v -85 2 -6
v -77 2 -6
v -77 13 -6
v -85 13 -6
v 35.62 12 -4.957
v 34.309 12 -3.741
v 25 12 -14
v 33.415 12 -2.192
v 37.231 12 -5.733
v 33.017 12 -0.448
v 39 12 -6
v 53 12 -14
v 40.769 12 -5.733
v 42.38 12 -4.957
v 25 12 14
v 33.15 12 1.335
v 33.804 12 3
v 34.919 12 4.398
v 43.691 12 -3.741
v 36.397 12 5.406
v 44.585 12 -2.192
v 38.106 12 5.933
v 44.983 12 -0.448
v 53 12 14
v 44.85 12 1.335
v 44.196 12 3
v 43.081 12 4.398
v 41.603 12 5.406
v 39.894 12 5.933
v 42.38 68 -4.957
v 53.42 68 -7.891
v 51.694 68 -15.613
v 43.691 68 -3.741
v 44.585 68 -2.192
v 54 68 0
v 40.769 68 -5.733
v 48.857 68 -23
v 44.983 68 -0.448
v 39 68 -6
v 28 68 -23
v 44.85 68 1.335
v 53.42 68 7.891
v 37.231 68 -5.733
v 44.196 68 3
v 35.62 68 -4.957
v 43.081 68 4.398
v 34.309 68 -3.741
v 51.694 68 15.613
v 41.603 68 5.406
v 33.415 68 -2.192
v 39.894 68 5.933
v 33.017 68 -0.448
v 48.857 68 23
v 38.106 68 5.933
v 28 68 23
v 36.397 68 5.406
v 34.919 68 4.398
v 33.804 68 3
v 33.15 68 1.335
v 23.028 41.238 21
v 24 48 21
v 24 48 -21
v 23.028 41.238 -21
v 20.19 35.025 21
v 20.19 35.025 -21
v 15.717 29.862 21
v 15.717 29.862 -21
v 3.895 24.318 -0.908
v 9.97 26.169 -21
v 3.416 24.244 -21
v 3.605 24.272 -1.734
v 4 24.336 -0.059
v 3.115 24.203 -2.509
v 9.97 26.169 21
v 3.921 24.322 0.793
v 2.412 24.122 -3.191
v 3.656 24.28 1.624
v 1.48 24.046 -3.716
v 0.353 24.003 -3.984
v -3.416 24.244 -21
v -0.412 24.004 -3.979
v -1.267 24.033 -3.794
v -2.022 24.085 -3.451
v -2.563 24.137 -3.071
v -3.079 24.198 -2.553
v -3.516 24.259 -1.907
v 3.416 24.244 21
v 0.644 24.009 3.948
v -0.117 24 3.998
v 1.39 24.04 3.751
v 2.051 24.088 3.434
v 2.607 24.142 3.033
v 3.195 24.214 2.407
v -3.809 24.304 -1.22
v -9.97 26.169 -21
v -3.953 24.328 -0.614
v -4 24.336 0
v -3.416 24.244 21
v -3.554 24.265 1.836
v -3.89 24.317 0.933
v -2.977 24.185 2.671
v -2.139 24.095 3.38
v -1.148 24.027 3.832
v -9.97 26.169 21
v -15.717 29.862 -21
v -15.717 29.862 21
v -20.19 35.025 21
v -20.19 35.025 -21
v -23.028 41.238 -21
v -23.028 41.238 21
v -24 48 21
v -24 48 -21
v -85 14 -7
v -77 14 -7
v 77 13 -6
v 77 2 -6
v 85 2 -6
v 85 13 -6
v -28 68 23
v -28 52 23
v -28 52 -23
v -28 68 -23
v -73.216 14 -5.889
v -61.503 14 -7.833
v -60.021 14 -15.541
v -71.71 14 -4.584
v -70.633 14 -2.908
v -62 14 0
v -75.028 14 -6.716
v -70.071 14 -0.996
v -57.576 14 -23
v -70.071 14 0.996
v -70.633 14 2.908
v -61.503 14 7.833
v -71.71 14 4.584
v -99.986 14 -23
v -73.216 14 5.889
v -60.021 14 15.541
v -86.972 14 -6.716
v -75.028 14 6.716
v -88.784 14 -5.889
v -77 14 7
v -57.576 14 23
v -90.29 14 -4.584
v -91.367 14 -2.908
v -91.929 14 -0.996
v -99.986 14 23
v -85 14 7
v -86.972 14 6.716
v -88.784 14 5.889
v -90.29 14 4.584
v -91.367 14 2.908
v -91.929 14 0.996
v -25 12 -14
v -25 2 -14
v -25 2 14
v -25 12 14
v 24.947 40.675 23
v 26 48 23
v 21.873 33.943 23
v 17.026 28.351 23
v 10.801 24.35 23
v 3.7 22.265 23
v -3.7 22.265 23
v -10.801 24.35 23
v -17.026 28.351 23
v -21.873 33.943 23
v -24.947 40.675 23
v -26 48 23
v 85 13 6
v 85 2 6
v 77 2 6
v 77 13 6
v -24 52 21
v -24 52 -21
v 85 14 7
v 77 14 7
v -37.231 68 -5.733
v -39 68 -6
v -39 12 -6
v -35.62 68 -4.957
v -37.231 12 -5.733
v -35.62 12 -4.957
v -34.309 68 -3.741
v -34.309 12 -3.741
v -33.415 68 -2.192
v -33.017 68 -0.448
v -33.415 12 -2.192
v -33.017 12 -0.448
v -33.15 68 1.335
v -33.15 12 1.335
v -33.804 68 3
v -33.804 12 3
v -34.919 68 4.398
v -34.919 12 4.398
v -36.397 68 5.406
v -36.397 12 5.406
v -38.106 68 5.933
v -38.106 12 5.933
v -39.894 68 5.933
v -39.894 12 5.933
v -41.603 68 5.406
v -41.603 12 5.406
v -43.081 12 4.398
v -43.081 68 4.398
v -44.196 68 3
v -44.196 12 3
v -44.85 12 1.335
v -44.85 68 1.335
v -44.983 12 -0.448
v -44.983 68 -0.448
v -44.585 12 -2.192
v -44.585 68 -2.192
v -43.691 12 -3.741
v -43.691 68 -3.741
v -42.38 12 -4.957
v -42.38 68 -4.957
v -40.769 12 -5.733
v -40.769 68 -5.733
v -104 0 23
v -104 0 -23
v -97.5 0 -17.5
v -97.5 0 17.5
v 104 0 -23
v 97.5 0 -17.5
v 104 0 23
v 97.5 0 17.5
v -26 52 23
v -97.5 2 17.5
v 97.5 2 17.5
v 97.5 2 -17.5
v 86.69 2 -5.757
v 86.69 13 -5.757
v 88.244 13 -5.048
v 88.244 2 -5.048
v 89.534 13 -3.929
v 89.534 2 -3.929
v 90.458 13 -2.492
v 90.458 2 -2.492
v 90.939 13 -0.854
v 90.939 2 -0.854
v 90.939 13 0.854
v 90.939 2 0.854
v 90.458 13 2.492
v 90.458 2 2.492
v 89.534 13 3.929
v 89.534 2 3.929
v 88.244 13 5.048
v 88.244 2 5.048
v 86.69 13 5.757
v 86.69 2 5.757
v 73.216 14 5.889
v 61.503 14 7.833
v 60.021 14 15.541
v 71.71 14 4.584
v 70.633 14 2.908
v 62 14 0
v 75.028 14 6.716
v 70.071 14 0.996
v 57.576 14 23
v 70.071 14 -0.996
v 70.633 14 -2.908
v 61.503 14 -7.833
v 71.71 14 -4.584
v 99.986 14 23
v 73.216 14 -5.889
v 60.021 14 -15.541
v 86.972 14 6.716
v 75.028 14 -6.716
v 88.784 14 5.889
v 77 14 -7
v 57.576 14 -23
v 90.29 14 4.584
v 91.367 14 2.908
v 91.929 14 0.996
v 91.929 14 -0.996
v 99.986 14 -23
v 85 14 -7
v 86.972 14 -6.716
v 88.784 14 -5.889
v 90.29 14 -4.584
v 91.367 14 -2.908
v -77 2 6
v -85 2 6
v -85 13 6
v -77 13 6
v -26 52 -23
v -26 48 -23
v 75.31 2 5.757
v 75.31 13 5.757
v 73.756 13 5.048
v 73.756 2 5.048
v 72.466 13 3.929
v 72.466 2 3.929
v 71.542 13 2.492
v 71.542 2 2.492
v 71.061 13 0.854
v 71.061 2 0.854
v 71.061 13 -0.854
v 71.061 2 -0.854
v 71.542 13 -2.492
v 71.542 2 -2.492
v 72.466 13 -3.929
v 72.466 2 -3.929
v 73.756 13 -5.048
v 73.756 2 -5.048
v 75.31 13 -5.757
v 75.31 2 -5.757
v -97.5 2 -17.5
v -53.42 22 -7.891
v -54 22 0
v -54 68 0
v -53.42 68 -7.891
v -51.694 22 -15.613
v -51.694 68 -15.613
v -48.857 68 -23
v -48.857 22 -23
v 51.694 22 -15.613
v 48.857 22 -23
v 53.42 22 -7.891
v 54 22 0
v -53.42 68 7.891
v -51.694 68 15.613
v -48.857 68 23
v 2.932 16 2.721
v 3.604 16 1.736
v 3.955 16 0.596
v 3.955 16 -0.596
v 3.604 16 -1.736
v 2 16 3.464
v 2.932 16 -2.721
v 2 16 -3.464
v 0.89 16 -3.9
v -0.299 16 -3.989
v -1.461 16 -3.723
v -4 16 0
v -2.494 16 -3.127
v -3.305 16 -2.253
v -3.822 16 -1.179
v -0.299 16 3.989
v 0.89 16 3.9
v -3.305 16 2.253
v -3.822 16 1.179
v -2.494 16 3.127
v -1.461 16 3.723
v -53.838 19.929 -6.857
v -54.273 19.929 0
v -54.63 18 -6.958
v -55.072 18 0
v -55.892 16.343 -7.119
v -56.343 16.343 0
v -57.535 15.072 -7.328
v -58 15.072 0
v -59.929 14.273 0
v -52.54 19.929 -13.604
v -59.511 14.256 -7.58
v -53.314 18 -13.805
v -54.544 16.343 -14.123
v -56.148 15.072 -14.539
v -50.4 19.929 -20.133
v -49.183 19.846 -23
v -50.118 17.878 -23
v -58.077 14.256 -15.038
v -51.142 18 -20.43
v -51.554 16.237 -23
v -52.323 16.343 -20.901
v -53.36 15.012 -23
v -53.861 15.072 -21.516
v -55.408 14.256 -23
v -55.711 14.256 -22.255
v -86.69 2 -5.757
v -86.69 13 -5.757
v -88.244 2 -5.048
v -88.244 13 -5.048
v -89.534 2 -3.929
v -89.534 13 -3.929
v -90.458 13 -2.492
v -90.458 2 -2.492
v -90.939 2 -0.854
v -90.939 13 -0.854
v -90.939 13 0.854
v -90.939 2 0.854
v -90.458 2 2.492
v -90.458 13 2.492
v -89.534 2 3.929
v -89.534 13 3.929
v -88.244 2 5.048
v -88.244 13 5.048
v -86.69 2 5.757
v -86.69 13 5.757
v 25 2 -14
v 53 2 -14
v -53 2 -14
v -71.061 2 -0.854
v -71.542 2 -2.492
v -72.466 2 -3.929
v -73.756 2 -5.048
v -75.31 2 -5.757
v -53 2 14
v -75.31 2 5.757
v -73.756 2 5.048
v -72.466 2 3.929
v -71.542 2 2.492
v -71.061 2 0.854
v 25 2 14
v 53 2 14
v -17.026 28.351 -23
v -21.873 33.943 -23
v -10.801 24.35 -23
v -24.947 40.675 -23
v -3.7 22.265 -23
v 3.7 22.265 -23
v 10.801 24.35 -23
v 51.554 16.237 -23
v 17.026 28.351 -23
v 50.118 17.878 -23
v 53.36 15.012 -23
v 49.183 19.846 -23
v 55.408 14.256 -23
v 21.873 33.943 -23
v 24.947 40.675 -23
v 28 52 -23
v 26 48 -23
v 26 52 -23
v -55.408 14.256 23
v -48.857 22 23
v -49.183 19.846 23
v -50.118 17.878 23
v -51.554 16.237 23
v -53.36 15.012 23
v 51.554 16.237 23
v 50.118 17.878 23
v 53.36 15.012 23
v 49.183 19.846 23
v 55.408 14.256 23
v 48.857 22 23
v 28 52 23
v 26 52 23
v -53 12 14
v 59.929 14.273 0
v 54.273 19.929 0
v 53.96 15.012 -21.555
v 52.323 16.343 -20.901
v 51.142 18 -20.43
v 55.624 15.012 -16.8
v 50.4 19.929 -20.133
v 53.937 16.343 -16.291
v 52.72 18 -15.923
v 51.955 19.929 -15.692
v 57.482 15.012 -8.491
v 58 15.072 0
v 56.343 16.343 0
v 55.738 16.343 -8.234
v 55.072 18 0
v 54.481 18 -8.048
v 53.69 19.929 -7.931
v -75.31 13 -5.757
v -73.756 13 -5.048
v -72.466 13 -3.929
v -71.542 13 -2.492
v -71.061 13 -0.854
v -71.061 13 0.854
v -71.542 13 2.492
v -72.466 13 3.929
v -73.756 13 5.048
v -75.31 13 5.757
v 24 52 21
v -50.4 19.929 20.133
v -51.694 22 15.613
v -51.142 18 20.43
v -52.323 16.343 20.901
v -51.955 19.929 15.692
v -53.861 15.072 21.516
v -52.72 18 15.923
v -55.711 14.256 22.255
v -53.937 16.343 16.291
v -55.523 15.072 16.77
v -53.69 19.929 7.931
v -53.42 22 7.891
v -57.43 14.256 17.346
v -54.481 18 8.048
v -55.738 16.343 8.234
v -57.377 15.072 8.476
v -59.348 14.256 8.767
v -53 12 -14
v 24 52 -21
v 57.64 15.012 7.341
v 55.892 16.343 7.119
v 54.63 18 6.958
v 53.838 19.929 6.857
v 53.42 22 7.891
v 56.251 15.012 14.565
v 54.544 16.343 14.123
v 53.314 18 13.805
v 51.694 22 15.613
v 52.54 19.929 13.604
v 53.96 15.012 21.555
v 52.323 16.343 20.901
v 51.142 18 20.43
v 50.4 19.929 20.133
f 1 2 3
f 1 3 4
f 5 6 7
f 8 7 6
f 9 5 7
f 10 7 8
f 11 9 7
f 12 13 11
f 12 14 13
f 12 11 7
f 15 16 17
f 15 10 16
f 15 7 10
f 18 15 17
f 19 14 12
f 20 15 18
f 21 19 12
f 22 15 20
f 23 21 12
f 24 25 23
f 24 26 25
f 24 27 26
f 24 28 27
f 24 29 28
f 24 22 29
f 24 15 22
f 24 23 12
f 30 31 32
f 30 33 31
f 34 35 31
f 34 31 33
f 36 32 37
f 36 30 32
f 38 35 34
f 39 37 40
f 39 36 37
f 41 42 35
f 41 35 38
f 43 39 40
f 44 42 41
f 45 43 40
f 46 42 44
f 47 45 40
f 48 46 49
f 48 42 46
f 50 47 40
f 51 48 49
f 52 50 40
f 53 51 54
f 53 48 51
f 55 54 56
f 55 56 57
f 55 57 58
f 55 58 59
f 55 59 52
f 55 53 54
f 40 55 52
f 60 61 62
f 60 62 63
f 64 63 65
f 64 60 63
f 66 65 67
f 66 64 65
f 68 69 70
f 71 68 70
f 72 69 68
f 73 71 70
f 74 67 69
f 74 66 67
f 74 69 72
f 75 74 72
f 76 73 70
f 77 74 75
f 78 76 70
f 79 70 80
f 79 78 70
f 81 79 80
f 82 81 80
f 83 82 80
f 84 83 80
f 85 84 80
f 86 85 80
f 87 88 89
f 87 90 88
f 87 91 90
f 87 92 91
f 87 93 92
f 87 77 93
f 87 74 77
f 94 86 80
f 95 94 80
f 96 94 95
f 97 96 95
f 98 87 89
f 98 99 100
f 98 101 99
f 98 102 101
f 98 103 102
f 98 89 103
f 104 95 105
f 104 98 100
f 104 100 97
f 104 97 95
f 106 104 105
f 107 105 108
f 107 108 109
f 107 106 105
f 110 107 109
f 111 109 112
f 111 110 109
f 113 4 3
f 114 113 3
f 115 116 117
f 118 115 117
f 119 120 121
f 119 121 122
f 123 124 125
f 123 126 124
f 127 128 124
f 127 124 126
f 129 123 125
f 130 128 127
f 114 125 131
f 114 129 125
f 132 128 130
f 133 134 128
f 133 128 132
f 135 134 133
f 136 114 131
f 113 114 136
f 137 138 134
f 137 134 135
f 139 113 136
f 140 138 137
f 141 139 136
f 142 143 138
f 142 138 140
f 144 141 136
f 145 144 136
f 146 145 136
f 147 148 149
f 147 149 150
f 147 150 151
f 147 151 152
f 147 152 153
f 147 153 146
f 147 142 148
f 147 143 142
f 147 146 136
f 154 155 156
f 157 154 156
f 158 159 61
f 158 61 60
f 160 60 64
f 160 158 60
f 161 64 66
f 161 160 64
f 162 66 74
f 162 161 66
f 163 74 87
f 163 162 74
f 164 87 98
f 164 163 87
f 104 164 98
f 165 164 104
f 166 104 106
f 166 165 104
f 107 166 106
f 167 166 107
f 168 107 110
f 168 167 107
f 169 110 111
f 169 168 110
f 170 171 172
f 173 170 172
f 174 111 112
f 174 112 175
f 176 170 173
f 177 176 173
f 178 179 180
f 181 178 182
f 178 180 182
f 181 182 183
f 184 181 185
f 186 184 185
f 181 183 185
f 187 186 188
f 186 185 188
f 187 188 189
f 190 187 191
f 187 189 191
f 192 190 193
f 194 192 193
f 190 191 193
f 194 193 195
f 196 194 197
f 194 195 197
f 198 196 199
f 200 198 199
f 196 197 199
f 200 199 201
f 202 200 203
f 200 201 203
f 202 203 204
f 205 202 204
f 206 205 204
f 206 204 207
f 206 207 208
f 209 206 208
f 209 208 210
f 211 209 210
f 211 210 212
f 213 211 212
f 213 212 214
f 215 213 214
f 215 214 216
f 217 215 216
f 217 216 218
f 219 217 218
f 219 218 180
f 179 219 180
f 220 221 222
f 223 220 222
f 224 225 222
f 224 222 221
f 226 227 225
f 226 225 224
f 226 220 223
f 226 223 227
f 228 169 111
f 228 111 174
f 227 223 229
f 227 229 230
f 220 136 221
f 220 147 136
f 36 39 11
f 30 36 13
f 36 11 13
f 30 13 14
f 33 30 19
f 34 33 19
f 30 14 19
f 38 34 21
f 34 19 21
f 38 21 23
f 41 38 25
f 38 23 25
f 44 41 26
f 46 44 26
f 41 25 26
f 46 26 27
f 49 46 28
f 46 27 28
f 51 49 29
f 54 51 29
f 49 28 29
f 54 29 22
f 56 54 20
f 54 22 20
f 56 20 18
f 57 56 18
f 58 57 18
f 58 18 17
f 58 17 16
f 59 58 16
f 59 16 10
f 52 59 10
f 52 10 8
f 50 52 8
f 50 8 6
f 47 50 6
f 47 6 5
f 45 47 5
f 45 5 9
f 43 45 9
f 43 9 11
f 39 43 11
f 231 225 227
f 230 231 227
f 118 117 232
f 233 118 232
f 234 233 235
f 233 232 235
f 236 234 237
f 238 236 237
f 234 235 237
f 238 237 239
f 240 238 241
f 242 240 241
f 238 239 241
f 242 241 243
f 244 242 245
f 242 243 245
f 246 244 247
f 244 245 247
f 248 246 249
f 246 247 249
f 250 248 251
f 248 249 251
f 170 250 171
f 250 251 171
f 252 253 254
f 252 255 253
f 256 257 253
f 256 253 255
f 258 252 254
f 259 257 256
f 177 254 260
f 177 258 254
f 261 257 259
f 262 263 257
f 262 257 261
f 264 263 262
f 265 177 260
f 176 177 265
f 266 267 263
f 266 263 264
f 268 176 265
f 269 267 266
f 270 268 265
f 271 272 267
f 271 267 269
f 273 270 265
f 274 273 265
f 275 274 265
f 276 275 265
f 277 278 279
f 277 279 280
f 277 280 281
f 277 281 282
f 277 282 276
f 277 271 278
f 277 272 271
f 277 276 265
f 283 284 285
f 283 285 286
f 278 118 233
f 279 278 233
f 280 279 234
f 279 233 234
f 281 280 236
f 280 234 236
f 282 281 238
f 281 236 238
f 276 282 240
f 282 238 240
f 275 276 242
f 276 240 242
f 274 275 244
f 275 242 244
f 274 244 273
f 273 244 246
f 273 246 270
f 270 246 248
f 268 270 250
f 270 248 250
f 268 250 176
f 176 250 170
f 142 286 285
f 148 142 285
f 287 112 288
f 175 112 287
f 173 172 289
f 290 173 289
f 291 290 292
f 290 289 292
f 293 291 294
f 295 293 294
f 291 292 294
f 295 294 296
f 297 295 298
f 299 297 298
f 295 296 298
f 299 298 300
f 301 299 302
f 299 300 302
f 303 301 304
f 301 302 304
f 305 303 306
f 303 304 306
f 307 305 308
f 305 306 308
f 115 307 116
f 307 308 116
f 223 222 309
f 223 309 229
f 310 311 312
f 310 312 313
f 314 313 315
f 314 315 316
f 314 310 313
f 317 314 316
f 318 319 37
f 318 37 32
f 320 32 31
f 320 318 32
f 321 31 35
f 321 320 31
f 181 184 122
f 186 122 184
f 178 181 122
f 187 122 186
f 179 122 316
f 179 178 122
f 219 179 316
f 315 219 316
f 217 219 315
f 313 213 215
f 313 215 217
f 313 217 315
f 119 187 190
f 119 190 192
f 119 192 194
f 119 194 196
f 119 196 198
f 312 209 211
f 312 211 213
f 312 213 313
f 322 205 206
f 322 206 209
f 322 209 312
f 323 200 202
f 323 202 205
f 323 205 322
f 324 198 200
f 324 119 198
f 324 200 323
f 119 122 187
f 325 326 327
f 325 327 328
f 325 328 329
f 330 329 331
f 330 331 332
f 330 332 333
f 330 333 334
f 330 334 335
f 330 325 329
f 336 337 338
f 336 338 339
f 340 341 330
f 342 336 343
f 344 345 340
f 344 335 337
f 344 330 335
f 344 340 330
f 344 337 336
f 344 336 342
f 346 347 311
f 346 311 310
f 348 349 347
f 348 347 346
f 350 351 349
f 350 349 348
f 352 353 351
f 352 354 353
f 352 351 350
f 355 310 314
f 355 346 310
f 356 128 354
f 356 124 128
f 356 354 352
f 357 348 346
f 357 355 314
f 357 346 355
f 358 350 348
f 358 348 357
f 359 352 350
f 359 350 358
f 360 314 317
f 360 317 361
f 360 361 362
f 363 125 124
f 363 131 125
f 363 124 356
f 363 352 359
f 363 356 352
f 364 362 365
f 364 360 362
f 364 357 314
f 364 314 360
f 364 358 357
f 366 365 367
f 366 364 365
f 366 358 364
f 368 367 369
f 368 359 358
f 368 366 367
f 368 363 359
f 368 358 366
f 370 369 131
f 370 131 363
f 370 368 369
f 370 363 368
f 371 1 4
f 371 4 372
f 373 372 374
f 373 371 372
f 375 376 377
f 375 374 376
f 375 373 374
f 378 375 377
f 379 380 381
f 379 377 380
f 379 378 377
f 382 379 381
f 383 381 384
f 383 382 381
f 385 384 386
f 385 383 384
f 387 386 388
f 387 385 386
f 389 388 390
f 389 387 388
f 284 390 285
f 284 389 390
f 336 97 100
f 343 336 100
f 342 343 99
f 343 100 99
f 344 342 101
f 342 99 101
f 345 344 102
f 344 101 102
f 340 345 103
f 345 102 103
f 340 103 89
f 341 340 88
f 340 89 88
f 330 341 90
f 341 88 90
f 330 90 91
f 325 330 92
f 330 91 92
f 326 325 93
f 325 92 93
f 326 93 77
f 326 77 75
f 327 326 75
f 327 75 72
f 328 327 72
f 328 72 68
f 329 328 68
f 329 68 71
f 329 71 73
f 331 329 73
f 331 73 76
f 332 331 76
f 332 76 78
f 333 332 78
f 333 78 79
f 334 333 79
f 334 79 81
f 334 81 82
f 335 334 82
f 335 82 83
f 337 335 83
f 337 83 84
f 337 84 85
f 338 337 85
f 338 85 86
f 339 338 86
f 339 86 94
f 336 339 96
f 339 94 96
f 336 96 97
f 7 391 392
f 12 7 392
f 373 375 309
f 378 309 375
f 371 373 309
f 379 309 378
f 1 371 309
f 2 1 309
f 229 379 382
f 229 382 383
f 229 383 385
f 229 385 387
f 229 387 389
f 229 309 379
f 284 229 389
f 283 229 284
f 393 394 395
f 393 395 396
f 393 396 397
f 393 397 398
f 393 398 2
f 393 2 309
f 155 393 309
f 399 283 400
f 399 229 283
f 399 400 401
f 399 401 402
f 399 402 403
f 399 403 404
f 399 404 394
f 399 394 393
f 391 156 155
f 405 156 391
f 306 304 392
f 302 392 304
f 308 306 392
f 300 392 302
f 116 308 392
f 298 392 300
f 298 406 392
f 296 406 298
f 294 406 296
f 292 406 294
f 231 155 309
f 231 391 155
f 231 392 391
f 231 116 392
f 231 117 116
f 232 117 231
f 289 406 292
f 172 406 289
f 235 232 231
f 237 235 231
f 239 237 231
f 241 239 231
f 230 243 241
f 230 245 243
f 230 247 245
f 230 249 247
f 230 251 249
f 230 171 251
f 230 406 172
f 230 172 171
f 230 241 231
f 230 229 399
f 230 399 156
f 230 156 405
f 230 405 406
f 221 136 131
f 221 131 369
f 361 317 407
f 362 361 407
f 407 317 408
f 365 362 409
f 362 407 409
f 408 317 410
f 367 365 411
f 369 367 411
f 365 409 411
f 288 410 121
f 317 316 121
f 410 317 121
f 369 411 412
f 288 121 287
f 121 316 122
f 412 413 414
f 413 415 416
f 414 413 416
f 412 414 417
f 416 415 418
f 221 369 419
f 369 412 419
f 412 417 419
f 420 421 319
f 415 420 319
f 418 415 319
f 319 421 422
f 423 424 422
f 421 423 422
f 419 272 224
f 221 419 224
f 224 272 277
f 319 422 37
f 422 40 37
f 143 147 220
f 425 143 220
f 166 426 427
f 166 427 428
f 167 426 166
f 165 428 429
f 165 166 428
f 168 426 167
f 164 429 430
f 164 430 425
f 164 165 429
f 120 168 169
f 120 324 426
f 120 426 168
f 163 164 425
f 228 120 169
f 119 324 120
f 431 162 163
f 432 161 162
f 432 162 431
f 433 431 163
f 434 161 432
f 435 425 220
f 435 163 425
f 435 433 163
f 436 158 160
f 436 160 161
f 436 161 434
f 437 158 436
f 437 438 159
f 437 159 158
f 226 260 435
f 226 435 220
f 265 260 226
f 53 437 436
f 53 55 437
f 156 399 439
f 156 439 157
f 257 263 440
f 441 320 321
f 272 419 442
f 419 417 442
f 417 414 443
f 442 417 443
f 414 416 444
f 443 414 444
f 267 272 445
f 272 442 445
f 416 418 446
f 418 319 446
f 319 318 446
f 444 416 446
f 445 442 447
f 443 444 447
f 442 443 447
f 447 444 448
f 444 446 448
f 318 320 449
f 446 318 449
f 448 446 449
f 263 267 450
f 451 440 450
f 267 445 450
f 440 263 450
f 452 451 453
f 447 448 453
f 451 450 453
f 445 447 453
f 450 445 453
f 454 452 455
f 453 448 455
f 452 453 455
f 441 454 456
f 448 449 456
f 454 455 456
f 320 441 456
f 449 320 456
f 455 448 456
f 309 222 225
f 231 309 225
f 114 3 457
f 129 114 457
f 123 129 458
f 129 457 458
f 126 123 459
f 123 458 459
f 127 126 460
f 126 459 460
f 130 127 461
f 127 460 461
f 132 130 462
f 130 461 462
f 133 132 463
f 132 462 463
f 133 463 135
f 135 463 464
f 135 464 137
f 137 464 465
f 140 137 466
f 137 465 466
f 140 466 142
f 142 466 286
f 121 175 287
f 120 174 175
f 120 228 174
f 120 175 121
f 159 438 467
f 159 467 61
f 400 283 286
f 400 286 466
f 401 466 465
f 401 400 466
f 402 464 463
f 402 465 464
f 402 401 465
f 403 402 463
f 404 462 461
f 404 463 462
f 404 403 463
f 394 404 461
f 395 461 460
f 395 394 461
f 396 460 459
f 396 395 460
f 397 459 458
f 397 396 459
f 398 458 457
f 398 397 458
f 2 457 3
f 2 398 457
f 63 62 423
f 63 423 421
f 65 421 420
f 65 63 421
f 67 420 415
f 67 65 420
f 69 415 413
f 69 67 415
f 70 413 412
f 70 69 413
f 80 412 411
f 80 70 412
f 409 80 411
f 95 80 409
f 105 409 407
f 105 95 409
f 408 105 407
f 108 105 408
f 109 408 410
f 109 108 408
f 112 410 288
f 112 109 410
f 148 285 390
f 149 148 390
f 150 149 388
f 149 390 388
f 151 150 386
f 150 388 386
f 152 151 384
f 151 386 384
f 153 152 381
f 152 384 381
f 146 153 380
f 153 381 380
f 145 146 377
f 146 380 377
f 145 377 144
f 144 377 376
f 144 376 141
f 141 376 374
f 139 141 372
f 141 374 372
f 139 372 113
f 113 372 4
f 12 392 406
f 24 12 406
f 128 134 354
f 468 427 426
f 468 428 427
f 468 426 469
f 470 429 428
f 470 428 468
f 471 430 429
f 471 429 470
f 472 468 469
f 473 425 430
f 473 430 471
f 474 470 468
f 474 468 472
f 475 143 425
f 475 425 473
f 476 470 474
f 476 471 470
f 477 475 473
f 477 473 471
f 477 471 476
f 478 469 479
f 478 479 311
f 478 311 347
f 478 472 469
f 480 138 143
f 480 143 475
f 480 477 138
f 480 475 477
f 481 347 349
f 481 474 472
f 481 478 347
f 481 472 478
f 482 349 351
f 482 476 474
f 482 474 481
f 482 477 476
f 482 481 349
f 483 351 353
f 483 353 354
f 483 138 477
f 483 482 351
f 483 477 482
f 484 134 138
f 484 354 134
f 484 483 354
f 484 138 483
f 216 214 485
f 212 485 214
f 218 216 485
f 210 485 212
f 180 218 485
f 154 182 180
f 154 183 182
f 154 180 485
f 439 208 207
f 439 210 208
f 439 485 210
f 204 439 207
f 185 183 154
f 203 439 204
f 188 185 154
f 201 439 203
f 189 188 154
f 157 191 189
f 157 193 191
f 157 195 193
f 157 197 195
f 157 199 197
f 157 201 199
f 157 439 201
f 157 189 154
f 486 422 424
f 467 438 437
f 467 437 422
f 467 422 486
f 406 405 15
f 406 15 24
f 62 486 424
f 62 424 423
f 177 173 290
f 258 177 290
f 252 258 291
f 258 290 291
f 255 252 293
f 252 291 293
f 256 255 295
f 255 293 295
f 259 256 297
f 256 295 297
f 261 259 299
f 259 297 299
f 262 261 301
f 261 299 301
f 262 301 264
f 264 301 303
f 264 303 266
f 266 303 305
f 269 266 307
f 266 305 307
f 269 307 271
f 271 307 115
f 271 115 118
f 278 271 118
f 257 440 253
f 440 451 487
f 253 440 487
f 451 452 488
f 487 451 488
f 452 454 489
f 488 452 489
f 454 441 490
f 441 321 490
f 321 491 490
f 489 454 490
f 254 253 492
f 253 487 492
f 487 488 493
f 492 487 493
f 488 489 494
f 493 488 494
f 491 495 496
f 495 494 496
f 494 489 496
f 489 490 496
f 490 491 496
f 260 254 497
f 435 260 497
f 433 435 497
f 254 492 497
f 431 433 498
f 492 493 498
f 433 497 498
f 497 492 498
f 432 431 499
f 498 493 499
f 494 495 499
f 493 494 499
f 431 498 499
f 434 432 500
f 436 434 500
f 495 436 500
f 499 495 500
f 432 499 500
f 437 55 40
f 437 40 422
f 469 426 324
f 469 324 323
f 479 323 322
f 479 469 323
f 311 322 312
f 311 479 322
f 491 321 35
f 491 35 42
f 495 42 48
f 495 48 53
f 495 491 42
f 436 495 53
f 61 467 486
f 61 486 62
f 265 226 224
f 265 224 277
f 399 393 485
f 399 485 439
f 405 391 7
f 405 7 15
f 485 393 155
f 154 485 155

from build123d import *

# Parameters (mm, degrees)
BOSS_EXTRUDE1_DEPTH = 23
CUT_EXTRUDE1_START  = -54
CUT_EXTRUDE1_DEPTH  = 54
CUT_EXTRUDE2_REACH  = 128.369
SKETCH3_R           = 6
SKETCH3_3_W         = 28
SKETCH3_3_H         = 28
SKETCH3_3_R         = 6
CUT_EXTRUDE3_DEPTH  = 12
SKETCH3_4_W         = 195
SKETCH3_4_H         = 35
SKETCH3_4_W_2       = 28
SKETCH3_4_H_2       = 28
CUT_EXTRUDE4_DEPTH  = 2
FILLET1_R           = 8
CHAMFER1_SIZE       = 2
CHAMFER2_SIZE       = 1
SKETCH4_R           = 4
CUT_EXTRUDE5_DEPTH  = 52


# Read off the part's stored shape, not the designer's step: Cut-Extrude1
with BuildPart() as part:
    # Sketch1 → Boss-Extrude1 (new, symmetric)
    with BuildSketch(Plane.XY):
        with BuildLine():
            Line((-104, 0), (104, 0))
            Line((104, 0), (99.985564599, 14))
            Line((99.985564599, 14), (54, 14))
            Line((54, 14), (54, 68))
            Line((54, 68), (28, 68))
            Line((28, 68), (28, 52))
            Line((28, 52), (24, 52))
            Line((24, 52), (24, 48))
            ThreePointArc((24, 48), (0, 24), (-24, 48))
            Line((-24, 48), (-24, 52))
            Line((-24, 52), (-28, 52))
            Line((-28, 52), (-28, 68))
            Line((-28, 68), (-54, 68))
            Line((-54, 68), (-54, 14))
            Line((-54, 14), (-99.985564599, 14))
            Line((-99.985564599, 14), (-104, 0))
        make_face()
    extrude(amount=BOSS_EXTRUDE1_DEPTH, both=True)

    # Cut-Extrude1 outline → Cut-Extrude1 (cut)
    with BuildSketch(Plane(origin=(0, 68, 0), x_dir=(1, 0, 0), z_dir=(0, 1, 0)).offset(CUT_EXTRUDE1_START)):
        with BuildLine():
            ThreePointArc((-54, 0), (-52.698550436, 11.784005345), (-48.856934001, 23))
            Line((-48.856934001, 23), (-54, 23))
            Line((-54, 23), (-54, 0))
        make_face()
        with BuildLine():
            ThreePointArc((-48.856934001, -23), (-52.698550436, -11.784005345), (-54, 0))
            Line((-54, 0), (-54, -23))
            Line((-54, -23), (-48.856934001, -23))
        make_face()
        with BuildLine():
            Line((54, 23), (48.856934001, 23))
            ThreePointArc((48.856934001, 23), (52.698550436, 11.784005345), (54, 0))
            Line((54, 0), (54, 23))
        make_face()
        with BuildLine():
            Line((54, -23), (54, 0))
            ThreePointArc((54, 0), (52.698550436, -11.784005345), (48.856934001, -23))
            Line((48.856934001, -23), (54, -23))
        make_face()
    extrude(amount=CUT_EXTRUDE1_DEPTH, mode=Mode.SUBTRACT)

    # Sketch3 → Cut-Extrude2 (cut, up to next)
    with BuildSketch(Plane.XZ, mode=Mode.PRIVATE) as cut_extrude2_sk1:
        with Locations(Location((-39, 0, 0), (0, 0, 270))):
            Circle(SKETCH3_R)
    cut_extrude2_tool1 = extrude(cut_extrude2_sk1.sketch, amount=-CUT_EXTRUDE2_REACH, mode=Mode.PRIVATE) & part.part
    # Sketch3 → Cut-Extrude2 (cut, up to next)
    with BuildSketch(Plane.XZ, mode=Mode.PRIVATE) as cut_extrude2_sk2:
        with Locations(Location((39, 0, 0), (0, 0, 270))):
            Circle(SKETCH3_R)
    cut_extrude2_tool2 = extrude(cut_extrude2_sk2.sketch, amount=-CUT_EXTRUDE2_REACH, mode=Mode.PRIVATE) & part.part
    # Sketch3 → Cut-Extrude2 (cut, up to next)
    with BuildSketch(Plane.XZ, mode=Mode.PRIVATE) as cut_extrude2_sk3:
        with BuildLine():
            Line((77, -6), (85, -6))
            ThreePointArc((85, -6), (91, 0), (85, 6))
            Line((85, 6), (77, 6))
            ThreePointArc((77, 6), (71, 0), (77, -6))
        make_face()
    cut_extrude2_tool3 = extrude(cut_extrude2_sk3.sketch, amount=-CUT_EXTRUDE2_REACH, mode=Mode.PRIVATE) & part.part
    # Sketch3 → Cut-Extrude2 (cut, up to next)
    with BuildSketch(Plane.XZ, mode=Mode.PRIVATE) as cut_extrude2_sk4:
        with BuildLine():
            ThreePointArc((-85, -6), (-91, 0), (-85, 6))
            Line((-85, 6), (-77, 6))
            ThreePointArc((-77, 6), (-71, 0), (-77, -6))
            Line((-77, -6), (-85, -6))
        make_face()
    cut_extrude2_tool4 = extrude(cut_extrude2_sk4.sketch, amount=-CUT_EXTRUDE2_REACH, mode=Mode.PRIVATE) & part.part
    add(cut_extrude2_tool1.solids().sort_by_distance((-39, 0, 0))[0], mode=Mode.SUBTRACT)
    add(cut_extrude2_tool2.solids().sort_by_distance((39, 0, 0))[0], mode=Mode.SUBTRACT)
    add(cut_extrude2_tool3.solids().sort_by_distance((81, 0, 0))[0], mode=Mode.SUBTRACT)
    add(cut_extrude2_tool4.solids().sort_by_distance((-81, 0, 0))[0], mode=Mode.SUBTRACT)

    # Sketch3<3> → Cut-Extrude3 (cut)
    # profile 1 of 2: a face of its own
    with BuildSketch(Plane.XZ):
        with Locations((39, 0)):
            Rectangle(SKETCH3_3_W, SKETCH3_3_H)
        with Locations(Location((39, 0, 0), (0, 0, 270))):
            Circle(SKETCH3_3_R, mode=Mode.SUBTRACT)
    # profile 2 of 2: a face of its own
    with BuildSketch(Plane.XZ):
        with Locations((-39, 0)):
            Rectangle(SKETCH3_3_W, SKETCH3_3_H)
        with Locations(Location((-39, 0, 0), (0, 0, 270))):
            Circle(SKETCH3_3_R, mode=Mode.SUBTRACT)
    extrude(amount=-CUT_EXTRUDE3_DEPTH, mode=Mode.SUBTRACT)

    # Sketch3<4> → Cut-Extrude4 (cut)
    with BuildSketch(Plane.XZ):
        Rectangle(SKETCH3_4_W, SKETCH3_4_H)
        with BuildLine():
            ThreePointArc((85, -6), (91, 0), (85, 6))
            Line((85, 6), (77, 6))
            ThreePointArc((77, 6), (71, 0), (77, -6))
            Line((77, -6), (85, -6))
        make_face(mode=Mode.SUBTRACT)
        with Locations((-39, 0)):
            Rectangle(SKETCH3_4_W_2, SKETCH3_4_H_2, mode=Mode.SUBTRACT)
        with Locations((39, 0)):
            Rectangle(SKETCH3_4_W_2, SKETCH3_4_H_2, mode=Mode.SUBTRACT)
        with BuildLine():
            Line((-77, -6), (-85, -6))
            ThreePointArc((-85, -6), (-91, 0), (-85, 6))
            Line((-85, 6), (-77, 6))
            ThreePointArc((-77, 6), (-71, 0), (-77, -6))
        make_face(mode=Mode.SUBTRACT)
    extrude(amount=-CUT_EXTRUDE4_DEPTH, mode=Mode.SUBTRACT)

    # Fillet1
    fillet1_edges = [part.edges().sort_by_distance(p)[0] for p in [
        (-52.698550436, 14, -11.784005345),
        (52.698550436, 14, -11.784005345),
    ]]
    fillet(fillet1_edges, radius=FILLET1_R)

    # Chamfer1
    chamfer1_edges = [part.edges().sort_by_distance(p)[0] for p in [
        (-24, 50, -23),
        (0, 24, -23),
        (24, 50, -23),
        (24, 50, 23),
        (0, 24, 23),
        (-24, 50, 23),
    ]]
    chamfer(chamfer1_edges, length=CHAMFER1_SIZE)

    # Chamfer2
    chamfer2_edges = [part.edges().sort_by_distance(p)[0] for p in [
        (91, 14, 0),
        (81, 14, -6),
        (71, 14, 0),
        (-91, 14, 0),
        (-71, 14, 0),
        (-81, 14, -6),
        (-81, 14, 6),
        (81, 14, 6),
    ]]
    chamfer(chamfer2_edges, length=CHAMFER2_SIZE)

    # Sketch4 → Cut-Extrude5 (cut)
    with BuildSketch(Plane(origin=(0, 68, 0), x_dir=(1, 0, 0), z_dir=(0, 1, 0))):
        with Locations(Location((0, 0, 0), (0, 0, 180))):
            Circle(SKETCH4_R)
    extrude(amount=-CUT_EXTRUDE5_DEPTH, mode=Mode.SUBTRACT)


solid = part.part
